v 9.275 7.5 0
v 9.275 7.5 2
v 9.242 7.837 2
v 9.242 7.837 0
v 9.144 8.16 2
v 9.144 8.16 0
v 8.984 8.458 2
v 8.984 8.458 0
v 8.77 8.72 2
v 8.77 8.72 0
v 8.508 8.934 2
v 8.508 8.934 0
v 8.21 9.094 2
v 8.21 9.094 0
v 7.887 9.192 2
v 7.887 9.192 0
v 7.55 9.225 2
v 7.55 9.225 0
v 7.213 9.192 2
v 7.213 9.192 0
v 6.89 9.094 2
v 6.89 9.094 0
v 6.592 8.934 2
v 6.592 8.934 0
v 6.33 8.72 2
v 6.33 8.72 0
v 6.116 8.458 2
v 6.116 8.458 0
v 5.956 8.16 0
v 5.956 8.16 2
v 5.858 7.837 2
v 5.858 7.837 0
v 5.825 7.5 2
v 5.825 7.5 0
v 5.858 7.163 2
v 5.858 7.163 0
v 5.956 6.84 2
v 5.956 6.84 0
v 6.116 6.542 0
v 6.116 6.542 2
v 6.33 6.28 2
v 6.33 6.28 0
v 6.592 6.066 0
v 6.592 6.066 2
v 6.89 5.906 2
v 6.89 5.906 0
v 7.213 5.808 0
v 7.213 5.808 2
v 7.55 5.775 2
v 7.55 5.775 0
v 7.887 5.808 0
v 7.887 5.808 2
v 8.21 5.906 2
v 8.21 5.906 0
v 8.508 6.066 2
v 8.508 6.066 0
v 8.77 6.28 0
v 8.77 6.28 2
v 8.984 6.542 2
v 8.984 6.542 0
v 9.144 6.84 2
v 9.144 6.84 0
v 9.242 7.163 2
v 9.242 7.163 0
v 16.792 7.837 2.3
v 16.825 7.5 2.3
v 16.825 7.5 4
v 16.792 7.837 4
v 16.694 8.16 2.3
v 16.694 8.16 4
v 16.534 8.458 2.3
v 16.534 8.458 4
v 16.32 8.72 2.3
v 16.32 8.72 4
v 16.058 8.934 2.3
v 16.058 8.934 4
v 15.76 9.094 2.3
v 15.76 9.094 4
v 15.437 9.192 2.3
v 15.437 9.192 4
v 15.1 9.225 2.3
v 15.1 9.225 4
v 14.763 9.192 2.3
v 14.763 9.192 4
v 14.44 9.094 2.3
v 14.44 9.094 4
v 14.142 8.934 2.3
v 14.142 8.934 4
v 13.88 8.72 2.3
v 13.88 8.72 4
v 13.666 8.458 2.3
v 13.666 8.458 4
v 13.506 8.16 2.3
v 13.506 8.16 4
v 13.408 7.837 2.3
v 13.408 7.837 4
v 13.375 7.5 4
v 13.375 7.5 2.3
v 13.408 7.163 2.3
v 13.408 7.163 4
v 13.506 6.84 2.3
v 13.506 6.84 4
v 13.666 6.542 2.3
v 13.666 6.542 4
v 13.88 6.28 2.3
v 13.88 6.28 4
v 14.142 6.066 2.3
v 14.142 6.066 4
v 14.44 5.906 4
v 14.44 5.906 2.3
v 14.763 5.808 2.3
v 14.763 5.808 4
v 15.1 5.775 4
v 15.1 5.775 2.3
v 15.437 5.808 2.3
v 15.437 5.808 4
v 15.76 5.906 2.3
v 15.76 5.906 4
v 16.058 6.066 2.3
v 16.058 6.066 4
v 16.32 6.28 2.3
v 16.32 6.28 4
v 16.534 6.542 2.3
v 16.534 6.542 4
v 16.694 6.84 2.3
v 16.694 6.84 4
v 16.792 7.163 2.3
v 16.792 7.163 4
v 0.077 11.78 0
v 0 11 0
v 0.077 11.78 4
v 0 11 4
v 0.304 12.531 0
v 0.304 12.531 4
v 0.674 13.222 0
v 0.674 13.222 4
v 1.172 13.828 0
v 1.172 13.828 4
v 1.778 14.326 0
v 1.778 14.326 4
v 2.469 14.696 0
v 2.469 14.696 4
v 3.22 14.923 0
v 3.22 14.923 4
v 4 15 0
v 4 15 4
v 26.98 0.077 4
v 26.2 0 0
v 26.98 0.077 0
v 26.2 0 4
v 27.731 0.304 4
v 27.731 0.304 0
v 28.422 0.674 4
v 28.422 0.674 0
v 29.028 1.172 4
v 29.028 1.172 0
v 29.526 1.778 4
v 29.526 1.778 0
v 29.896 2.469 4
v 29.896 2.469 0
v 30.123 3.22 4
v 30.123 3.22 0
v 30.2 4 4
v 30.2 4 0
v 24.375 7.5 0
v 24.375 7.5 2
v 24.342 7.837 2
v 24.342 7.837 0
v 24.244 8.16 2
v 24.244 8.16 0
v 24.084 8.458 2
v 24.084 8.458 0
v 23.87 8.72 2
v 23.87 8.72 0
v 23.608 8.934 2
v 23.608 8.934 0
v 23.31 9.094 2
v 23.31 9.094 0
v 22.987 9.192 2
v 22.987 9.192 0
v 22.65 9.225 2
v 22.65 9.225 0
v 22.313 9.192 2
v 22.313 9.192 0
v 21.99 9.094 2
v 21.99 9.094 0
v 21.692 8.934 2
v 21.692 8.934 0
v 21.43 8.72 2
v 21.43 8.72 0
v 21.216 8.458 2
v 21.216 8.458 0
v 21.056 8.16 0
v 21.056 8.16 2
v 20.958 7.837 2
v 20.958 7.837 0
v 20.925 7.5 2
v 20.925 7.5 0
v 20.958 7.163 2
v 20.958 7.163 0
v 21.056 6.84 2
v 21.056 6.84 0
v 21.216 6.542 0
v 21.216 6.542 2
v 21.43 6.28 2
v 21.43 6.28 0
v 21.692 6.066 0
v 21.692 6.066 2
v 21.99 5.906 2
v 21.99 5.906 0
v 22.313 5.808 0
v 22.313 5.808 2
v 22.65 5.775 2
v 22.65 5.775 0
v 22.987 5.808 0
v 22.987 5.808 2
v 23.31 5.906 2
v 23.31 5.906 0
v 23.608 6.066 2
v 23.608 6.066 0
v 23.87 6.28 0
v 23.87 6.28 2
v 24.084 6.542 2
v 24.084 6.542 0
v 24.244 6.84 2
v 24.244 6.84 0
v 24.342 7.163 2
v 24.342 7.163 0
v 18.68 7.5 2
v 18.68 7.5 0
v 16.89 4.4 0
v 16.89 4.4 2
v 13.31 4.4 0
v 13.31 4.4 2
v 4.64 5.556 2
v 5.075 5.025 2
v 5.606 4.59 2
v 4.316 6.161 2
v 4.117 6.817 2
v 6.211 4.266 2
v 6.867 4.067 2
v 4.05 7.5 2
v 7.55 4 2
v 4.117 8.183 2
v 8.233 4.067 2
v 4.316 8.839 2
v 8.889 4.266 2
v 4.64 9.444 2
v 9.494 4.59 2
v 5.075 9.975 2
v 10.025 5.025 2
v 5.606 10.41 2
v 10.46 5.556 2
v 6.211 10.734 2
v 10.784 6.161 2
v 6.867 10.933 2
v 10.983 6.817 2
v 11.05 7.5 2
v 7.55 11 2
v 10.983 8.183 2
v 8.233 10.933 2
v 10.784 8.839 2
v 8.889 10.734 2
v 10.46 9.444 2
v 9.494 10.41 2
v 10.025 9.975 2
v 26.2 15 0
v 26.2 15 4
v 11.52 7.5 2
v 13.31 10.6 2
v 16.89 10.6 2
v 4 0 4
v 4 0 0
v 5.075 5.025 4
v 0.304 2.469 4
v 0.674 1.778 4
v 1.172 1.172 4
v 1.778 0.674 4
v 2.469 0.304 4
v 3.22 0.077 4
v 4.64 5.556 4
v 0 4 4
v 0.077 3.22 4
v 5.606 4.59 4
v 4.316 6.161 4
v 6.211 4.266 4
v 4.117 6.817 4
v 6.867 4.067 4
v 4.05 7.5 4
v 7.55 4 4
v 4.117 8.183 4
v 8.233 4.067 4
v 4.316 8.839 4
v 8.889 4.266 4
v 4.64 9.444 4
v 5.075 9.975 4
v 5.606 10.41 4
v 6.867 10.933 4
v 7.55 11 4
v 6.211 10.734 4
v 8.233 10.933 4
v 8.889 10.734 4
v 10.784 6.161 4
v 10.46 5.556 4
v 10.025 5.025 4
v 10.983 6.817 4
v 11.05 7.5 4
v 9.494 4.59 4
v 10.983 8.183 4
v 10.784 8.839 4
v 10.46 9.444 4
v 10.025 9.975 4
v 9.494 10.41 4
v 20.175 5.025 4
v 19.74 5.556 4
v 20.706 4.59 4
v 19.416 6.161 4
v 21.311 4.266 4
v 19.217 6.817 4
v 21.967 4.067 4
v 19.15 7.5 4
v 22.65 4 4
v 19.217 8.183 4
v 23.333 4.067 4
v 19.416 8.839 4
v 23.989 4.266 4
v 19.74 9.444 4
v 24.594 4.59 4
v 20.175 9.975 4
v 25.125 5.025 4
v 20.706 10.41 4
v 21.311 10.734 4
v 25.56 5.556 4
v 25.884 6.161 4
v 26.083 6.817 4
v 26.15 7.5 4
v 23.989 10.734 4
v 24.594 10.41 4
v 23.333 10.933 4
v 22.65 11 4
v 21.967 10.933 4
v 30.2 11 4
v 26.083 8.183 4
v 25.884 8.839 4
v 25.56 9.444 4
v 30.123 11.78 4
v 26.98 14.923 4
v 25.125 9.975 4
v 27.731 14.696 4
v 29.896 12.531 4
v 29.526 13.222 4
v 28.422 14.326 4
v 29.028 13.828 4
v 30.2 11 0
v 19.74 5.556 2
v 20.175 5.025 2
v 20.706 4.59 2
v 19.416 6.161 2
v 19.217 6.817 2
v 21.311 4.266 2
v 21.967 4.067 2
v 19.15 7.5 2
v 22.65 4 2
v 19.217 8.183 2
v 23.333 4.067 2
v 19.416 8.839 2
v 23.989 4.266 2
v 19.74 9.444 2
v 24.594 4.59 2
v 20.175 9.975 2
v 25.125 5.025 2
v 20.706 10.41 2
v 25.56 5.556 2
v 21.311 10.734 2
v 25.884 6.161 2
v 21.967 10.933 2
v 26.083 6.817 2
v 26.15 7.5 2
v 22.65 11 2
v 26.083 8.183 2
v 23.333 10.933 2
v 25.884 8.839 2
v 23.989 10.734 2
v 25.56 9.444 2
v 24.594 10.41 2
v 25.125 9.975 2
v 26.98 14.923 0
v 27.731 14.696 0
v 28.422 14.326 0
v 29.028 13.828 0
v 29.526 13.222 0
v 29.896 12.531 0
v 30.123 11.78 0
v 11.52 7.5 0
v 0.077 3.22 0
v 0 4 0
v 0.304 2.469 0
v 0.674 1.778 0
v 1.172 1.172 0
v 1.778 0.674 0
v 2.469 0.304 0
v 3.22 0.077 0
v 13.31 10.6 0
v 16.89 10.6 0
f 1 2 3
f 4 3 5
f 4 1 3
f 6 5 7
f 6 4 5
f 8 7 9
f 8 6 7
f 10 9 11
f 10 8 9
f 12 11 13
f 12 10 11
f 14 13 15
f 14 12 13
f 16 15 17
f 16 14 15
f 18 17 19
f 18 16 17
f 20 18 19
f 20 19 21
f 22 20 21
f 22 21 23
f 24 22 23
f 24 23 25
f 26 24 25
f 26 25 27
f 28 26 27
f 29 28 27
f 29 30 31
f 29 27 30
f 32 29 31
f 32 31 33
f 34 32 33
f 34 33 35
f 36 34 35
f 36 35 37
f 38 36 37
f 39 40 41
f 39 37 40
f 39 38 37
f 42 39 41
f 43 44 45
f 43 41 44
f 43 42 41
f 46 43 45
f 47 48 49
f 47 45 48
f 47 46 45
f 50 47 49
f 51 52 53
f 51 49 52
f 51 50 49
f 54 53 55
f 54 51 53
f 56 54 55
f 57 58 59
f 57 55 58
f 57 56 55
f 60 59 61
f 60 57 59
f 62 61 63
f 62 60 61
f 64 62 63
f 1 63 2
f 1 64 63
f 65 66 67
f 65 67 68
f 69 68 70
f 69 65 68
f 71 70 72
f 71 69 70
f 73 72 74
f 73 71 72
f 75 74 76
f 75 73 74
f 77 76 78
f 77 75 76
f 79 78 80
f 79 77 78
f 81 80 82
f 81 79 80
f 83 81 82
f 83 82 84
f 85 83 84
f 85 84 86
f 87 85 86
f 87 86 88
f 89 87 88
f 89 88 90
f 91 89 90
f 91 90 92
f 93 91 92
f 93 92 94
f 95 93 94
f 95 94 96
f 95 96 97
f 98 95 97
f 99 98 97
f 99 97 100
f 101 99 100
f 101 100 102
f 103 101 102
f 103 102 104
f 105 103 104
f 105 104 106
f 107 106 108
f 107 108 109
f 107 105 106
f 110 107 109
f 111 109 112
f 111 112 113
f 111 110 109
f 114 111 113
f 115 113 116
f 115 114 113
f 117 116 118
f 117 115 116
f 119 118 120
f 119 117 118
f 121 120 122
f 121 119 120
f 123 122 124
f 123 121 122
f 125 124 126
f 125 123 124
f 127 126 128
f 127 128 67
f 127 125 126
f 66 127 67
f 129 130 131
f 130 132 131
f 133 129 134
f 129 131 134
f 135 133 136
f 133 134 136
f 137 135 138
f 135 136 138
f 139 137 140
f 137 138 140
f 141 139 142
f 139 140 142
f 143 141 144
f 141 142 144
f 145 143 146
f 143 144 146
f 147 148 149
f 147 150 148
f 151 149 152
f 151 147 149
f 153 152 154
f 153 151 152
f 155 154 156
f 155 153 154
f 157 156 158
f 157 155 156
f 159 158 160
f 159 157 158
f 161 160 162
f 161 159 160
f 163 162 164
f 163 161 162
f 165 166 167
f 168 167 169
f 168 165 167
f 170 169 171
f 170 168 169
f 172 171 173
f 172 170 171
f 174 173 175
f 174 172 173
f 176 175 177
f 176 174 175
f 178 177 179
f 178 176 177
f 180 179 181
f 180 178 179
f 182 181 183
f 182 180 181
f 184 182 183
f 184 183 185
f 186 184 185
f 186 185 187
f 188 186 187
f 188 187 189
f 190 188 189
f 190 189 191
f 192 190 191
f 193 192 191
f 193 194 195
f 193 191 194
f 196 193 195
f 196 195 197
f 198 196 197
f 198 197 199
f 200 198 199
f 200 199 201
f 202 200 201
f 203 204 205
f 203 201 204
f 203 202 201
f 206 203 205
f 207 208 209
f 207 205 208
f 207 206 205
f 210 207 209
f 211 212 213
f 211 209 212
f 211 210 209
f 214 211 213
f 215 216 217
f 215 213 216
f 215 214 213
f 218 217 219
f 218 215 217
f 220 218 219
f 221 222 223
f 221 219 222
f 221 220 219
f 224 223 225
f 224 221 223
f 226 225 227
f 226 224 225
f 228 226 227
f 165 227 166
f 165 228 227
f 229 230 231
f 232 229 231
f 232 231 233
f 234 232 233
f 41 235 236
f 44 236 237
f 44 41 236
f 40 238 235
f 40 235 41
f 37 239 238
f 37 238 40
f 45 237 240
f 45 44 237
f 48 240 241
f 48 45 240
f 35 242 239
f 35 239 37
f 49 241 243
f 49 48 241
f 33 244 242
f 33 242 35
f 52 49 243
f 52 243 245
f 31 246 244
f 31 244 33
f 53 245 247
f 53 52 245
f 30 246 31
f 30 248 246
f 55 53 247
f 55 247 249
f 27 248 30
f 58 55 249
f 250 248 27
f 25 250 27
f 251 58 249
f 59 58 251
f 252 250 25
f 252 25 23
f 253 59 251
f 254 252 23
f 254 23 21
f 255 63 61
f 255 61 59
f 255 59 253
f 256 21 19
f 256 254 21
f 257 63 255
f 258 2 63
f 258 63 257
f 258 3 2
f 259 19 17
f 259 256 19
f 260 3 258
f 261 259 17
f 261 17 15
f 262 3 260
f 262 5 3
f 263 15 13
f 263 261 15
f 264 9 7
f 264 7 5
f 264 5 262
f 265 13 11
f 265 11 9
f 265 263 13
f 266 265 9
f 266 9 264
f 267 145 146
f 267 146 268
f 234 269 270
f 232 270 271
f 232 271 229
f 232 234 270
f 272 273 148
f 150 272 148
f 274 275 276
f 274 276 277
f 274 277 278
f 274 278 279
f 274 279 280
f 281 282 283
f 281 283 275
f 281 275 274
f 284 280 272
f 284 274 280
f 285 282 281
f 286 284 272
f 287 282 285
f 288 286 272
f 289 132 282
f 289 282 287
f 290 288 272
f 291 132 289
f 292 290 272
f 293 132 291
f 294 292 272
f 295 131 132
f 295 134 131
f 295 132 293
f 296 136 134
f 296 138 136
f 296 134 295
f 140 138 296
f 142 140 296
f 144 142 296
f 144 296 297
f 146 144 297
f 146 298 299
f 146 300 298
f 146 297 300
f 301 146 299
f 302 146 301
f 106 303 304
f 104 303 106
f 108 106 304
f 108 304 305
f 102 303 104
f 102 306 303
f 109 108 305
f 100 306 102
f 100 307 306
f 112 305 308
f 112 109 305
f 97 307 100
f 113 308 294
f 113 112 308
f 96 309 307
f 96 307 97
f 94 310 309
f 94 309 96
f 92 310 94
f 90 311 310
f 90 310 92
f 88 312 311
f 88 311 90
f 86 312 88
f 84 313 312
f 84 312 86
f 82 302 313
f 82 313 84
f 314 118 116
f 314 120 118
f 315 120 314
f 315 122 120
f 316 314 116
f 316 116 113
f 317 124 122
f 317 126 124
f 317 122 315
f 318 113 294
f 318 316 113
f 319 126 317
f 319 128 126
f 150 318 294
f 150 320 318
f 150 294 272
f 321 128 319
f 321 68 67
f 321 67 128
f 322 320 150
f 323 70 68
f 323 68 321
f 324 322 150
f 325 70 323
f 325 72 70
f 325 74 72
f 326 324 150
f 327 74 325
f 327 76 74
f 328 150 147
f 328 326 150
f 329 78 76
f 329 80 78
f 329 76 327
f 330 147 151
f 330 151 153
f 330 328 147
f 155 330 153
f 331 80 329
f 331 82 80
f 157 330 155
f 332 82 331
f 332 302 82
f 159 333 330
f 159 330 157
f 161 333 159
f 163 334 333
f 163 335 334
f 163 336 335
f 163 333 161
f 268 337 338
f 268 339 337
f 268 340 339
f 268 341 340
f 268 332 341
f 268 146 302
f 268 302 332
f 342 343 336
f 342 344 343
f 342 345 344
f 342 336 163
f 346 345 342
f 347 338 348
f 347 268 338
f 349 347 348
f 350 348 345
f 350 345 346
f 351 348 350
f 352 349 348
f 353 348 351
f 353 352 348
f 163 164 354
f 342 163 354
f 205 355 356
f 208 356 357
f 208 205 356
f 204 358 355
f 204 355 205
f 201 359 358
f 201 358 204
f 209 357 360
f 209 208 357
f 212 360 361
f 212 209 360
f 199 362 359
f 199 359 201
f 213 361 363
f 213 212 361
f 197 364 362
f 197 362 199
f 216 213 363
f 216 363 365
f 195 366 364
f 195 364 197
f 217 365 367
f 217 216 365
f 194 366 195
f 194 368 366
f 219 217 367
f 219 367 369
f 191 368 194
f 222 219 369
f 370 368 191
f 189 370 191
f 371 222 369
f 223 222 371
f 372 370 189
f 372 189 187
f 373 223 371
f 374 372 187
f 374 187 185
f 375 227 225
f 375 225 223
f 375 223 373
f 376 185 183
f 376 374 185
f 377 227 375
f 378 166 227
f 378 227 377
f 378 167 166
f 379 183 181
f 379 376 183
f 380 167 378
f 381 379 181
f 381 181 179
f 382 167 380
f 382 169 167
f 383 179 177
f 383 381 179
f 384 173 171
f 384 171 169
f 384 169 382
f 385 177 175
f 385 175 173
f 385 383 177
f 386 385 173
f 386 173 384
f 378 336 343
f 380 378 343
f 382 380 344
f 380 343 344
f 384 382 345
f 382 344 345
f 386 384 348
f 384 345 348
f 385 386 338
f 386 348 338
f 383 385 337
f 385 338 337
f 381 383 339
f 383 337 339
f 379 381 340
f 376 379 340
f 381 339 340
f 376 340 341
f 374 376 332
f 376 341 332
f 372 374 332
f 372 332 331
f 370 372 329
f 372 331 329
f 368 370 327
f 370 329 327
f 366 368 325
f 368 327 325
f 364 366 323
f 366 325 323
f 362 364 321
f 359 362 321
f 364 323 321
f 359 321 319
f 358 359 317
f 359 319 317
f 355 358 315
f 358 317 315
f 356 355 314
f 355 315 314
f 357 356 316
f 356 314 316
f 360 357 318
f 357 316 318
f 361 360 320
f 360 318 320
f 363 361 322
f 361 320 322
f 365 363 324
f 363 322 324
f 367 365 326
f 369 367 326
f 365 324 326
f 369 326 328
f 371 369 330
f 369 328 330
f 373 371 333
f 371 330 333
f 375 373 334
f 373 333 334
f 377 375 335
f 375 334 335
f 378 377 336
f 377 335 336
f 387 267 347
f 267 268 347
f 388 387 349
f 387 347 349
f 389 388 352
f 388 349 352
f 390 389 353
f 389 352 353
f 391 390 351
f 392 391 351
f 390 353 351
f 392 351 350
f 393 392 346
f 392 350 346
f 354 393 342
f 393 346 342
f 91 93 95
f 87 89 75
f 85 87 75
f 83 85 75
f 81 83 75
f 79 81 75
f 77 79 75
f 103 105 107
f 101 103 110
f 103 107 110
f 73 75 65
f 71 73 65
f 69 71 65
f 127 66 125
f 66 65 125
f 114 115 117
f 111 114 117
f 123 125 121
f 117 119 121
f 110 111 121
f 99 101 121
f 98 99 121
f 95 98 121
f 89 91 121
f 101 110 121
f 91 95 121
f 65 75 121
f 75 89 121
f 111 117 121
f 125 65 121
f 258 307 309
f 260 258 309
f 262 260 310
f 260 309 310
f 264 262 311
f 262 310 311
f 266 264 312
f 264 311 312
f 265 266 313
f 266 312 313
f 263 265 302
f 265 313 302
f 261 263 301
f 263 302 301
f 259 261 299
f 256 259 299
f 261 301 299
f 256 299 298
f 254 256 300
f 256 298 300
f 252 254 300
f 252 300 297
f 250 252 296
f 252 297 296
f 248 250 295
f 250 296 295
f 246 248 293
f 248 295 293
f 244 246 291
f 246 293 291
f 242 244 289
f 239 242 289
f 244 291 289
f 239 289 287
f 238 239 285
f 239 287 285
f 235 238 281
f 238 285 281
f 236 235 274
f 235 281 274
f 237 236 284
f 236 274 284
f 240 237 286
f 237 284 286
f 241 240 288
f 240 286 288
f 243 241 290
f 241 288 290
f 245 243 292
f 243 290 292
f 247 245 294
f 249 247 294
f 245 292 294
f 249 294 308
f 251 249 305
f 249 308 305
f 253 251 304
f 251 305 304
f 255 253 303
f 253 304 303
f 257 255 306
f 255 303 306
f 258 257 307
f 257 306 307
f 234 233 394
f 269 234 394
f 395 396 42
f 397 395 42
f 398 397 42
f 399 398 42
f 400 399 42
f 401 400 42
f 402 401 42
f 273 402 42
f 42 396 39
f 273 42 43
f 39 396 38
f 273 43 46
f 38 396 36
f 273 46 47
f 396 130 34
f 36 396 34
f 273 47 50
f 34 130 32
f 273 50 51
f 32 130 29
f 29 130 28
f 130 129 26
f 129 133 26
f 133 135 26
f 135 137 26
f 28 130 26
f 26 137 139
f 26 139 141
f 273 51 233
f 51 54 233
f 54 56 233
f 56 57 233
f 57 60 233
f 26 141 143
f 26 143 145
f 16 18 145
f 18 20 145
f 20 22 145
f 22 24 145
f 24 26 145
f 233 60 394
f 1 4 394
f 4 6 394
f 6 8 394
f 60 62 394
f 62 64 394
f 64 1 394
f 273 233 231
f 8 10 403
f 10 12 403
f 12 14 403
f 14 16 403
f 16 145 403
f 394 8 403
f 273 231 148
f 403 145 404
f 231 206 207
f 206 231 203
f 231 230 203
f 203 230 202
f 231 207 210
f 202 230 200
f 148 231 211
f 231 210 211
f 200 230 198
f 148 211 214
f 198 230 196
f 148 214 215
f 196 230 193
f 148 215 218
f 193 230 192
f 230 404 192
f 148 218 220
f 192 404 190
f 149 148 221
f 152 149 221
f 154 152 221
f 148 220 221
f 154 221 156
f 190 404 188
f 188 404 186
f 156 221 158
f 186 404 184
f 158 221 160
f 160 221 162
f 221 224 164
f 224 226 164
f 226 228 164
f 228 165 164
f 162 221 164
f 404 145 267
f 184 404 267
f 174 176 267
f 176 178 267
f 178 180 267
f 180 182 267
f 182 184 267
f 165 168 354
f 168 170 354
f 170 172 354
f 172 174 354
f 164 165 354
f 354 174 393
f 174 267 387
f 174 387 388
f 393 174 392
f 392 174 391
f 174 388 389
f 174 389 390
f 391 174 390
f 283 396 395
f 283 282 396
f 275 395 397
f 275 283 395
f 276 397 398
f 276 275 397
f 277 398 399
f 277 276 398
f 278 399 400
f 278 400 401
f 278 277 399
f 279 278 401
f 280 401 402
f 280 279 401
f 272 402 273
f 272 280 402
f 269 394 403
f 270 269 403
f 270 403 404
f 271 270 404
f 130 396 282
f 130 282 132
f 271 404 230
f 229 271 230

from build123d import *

# Parameters (mm, degrees)
F0_W     = 30.2
F0_H     = 15
F0_R     = 1.725
F1_DEPTH = 4
F2_R     = 3.5
F3_DEPTH = 2
F5_DEPTH = 2
F6_R     = 1.75
F7_DEPTH = 0.3
F8_R     = 4


with BuildPart() as f1:
    # F0 (on Top) → F1 (new body)
    with BuildSketch(Plane.XY):
        with Locations((15.1, 7.5)):
            Rectangle(F0_W, F0_H)
        with Locations((7.55, 7.5)):
            Circle(F0_R, mode=Mode.SUBTRACT)
        with Locations((15.1, 7.5)):
            Circle(F0_R, mode=Mode.SUBTRACT)
        with Locations((22.65, 7.5)):
            Circle(F0_R, mode=Mode.SUBTRACT)
    extrude(amount=F1_DEPTH)

    # F2 (on face) → F3 (cut)
    with BuildSketch(Plane.XY.offset(4)):
        with Locations((7.55, 7.5)):
            Circle(F2_R)
        with Locations((22.65, 7.5)):
            Circle(F2_R)
    extrude(amount=-F3_DEPTH, mode=Mode.SUBTRACT)

    # F4 (on face) → F5 (cut)
    with BuildSketch(Plane(origin=(0, 0, 0), x_dir=(1, 0, 0), z_dir=(0, 0, -1))):
        Polygon((18.679572, -7.5), (16.889786, -4.4), (13.310214, -4.4), (11.520428, -7.5), (13.310214, -10.6), (16.889786, -10.6), align=None)
    extrude(amount=-F5_DEPTH, mode=Mode.SUBTRACT)

    # F6 (on face) → F7 (join)
    with BuildSketch(Plane(origin=(0, 0, 2), x_dir=(1, 0, 0), z_dir=(0, 0, -1))):
        with Locations((15.1, -7.5)):
            Circle(F6_R)
    extrude(amount=-F7_DEPTH)

    # F8
    f8_edges = [f1.edges().sort_by_distance(p)[0] for p in [
        (0, 0, 2),
        (30.2, 0, 2),
        (30.2, 15, 2),
        (0, 15, 2),
    ]]
    fillet(f8_edges, radius=F8_R)


solid = f1.part
